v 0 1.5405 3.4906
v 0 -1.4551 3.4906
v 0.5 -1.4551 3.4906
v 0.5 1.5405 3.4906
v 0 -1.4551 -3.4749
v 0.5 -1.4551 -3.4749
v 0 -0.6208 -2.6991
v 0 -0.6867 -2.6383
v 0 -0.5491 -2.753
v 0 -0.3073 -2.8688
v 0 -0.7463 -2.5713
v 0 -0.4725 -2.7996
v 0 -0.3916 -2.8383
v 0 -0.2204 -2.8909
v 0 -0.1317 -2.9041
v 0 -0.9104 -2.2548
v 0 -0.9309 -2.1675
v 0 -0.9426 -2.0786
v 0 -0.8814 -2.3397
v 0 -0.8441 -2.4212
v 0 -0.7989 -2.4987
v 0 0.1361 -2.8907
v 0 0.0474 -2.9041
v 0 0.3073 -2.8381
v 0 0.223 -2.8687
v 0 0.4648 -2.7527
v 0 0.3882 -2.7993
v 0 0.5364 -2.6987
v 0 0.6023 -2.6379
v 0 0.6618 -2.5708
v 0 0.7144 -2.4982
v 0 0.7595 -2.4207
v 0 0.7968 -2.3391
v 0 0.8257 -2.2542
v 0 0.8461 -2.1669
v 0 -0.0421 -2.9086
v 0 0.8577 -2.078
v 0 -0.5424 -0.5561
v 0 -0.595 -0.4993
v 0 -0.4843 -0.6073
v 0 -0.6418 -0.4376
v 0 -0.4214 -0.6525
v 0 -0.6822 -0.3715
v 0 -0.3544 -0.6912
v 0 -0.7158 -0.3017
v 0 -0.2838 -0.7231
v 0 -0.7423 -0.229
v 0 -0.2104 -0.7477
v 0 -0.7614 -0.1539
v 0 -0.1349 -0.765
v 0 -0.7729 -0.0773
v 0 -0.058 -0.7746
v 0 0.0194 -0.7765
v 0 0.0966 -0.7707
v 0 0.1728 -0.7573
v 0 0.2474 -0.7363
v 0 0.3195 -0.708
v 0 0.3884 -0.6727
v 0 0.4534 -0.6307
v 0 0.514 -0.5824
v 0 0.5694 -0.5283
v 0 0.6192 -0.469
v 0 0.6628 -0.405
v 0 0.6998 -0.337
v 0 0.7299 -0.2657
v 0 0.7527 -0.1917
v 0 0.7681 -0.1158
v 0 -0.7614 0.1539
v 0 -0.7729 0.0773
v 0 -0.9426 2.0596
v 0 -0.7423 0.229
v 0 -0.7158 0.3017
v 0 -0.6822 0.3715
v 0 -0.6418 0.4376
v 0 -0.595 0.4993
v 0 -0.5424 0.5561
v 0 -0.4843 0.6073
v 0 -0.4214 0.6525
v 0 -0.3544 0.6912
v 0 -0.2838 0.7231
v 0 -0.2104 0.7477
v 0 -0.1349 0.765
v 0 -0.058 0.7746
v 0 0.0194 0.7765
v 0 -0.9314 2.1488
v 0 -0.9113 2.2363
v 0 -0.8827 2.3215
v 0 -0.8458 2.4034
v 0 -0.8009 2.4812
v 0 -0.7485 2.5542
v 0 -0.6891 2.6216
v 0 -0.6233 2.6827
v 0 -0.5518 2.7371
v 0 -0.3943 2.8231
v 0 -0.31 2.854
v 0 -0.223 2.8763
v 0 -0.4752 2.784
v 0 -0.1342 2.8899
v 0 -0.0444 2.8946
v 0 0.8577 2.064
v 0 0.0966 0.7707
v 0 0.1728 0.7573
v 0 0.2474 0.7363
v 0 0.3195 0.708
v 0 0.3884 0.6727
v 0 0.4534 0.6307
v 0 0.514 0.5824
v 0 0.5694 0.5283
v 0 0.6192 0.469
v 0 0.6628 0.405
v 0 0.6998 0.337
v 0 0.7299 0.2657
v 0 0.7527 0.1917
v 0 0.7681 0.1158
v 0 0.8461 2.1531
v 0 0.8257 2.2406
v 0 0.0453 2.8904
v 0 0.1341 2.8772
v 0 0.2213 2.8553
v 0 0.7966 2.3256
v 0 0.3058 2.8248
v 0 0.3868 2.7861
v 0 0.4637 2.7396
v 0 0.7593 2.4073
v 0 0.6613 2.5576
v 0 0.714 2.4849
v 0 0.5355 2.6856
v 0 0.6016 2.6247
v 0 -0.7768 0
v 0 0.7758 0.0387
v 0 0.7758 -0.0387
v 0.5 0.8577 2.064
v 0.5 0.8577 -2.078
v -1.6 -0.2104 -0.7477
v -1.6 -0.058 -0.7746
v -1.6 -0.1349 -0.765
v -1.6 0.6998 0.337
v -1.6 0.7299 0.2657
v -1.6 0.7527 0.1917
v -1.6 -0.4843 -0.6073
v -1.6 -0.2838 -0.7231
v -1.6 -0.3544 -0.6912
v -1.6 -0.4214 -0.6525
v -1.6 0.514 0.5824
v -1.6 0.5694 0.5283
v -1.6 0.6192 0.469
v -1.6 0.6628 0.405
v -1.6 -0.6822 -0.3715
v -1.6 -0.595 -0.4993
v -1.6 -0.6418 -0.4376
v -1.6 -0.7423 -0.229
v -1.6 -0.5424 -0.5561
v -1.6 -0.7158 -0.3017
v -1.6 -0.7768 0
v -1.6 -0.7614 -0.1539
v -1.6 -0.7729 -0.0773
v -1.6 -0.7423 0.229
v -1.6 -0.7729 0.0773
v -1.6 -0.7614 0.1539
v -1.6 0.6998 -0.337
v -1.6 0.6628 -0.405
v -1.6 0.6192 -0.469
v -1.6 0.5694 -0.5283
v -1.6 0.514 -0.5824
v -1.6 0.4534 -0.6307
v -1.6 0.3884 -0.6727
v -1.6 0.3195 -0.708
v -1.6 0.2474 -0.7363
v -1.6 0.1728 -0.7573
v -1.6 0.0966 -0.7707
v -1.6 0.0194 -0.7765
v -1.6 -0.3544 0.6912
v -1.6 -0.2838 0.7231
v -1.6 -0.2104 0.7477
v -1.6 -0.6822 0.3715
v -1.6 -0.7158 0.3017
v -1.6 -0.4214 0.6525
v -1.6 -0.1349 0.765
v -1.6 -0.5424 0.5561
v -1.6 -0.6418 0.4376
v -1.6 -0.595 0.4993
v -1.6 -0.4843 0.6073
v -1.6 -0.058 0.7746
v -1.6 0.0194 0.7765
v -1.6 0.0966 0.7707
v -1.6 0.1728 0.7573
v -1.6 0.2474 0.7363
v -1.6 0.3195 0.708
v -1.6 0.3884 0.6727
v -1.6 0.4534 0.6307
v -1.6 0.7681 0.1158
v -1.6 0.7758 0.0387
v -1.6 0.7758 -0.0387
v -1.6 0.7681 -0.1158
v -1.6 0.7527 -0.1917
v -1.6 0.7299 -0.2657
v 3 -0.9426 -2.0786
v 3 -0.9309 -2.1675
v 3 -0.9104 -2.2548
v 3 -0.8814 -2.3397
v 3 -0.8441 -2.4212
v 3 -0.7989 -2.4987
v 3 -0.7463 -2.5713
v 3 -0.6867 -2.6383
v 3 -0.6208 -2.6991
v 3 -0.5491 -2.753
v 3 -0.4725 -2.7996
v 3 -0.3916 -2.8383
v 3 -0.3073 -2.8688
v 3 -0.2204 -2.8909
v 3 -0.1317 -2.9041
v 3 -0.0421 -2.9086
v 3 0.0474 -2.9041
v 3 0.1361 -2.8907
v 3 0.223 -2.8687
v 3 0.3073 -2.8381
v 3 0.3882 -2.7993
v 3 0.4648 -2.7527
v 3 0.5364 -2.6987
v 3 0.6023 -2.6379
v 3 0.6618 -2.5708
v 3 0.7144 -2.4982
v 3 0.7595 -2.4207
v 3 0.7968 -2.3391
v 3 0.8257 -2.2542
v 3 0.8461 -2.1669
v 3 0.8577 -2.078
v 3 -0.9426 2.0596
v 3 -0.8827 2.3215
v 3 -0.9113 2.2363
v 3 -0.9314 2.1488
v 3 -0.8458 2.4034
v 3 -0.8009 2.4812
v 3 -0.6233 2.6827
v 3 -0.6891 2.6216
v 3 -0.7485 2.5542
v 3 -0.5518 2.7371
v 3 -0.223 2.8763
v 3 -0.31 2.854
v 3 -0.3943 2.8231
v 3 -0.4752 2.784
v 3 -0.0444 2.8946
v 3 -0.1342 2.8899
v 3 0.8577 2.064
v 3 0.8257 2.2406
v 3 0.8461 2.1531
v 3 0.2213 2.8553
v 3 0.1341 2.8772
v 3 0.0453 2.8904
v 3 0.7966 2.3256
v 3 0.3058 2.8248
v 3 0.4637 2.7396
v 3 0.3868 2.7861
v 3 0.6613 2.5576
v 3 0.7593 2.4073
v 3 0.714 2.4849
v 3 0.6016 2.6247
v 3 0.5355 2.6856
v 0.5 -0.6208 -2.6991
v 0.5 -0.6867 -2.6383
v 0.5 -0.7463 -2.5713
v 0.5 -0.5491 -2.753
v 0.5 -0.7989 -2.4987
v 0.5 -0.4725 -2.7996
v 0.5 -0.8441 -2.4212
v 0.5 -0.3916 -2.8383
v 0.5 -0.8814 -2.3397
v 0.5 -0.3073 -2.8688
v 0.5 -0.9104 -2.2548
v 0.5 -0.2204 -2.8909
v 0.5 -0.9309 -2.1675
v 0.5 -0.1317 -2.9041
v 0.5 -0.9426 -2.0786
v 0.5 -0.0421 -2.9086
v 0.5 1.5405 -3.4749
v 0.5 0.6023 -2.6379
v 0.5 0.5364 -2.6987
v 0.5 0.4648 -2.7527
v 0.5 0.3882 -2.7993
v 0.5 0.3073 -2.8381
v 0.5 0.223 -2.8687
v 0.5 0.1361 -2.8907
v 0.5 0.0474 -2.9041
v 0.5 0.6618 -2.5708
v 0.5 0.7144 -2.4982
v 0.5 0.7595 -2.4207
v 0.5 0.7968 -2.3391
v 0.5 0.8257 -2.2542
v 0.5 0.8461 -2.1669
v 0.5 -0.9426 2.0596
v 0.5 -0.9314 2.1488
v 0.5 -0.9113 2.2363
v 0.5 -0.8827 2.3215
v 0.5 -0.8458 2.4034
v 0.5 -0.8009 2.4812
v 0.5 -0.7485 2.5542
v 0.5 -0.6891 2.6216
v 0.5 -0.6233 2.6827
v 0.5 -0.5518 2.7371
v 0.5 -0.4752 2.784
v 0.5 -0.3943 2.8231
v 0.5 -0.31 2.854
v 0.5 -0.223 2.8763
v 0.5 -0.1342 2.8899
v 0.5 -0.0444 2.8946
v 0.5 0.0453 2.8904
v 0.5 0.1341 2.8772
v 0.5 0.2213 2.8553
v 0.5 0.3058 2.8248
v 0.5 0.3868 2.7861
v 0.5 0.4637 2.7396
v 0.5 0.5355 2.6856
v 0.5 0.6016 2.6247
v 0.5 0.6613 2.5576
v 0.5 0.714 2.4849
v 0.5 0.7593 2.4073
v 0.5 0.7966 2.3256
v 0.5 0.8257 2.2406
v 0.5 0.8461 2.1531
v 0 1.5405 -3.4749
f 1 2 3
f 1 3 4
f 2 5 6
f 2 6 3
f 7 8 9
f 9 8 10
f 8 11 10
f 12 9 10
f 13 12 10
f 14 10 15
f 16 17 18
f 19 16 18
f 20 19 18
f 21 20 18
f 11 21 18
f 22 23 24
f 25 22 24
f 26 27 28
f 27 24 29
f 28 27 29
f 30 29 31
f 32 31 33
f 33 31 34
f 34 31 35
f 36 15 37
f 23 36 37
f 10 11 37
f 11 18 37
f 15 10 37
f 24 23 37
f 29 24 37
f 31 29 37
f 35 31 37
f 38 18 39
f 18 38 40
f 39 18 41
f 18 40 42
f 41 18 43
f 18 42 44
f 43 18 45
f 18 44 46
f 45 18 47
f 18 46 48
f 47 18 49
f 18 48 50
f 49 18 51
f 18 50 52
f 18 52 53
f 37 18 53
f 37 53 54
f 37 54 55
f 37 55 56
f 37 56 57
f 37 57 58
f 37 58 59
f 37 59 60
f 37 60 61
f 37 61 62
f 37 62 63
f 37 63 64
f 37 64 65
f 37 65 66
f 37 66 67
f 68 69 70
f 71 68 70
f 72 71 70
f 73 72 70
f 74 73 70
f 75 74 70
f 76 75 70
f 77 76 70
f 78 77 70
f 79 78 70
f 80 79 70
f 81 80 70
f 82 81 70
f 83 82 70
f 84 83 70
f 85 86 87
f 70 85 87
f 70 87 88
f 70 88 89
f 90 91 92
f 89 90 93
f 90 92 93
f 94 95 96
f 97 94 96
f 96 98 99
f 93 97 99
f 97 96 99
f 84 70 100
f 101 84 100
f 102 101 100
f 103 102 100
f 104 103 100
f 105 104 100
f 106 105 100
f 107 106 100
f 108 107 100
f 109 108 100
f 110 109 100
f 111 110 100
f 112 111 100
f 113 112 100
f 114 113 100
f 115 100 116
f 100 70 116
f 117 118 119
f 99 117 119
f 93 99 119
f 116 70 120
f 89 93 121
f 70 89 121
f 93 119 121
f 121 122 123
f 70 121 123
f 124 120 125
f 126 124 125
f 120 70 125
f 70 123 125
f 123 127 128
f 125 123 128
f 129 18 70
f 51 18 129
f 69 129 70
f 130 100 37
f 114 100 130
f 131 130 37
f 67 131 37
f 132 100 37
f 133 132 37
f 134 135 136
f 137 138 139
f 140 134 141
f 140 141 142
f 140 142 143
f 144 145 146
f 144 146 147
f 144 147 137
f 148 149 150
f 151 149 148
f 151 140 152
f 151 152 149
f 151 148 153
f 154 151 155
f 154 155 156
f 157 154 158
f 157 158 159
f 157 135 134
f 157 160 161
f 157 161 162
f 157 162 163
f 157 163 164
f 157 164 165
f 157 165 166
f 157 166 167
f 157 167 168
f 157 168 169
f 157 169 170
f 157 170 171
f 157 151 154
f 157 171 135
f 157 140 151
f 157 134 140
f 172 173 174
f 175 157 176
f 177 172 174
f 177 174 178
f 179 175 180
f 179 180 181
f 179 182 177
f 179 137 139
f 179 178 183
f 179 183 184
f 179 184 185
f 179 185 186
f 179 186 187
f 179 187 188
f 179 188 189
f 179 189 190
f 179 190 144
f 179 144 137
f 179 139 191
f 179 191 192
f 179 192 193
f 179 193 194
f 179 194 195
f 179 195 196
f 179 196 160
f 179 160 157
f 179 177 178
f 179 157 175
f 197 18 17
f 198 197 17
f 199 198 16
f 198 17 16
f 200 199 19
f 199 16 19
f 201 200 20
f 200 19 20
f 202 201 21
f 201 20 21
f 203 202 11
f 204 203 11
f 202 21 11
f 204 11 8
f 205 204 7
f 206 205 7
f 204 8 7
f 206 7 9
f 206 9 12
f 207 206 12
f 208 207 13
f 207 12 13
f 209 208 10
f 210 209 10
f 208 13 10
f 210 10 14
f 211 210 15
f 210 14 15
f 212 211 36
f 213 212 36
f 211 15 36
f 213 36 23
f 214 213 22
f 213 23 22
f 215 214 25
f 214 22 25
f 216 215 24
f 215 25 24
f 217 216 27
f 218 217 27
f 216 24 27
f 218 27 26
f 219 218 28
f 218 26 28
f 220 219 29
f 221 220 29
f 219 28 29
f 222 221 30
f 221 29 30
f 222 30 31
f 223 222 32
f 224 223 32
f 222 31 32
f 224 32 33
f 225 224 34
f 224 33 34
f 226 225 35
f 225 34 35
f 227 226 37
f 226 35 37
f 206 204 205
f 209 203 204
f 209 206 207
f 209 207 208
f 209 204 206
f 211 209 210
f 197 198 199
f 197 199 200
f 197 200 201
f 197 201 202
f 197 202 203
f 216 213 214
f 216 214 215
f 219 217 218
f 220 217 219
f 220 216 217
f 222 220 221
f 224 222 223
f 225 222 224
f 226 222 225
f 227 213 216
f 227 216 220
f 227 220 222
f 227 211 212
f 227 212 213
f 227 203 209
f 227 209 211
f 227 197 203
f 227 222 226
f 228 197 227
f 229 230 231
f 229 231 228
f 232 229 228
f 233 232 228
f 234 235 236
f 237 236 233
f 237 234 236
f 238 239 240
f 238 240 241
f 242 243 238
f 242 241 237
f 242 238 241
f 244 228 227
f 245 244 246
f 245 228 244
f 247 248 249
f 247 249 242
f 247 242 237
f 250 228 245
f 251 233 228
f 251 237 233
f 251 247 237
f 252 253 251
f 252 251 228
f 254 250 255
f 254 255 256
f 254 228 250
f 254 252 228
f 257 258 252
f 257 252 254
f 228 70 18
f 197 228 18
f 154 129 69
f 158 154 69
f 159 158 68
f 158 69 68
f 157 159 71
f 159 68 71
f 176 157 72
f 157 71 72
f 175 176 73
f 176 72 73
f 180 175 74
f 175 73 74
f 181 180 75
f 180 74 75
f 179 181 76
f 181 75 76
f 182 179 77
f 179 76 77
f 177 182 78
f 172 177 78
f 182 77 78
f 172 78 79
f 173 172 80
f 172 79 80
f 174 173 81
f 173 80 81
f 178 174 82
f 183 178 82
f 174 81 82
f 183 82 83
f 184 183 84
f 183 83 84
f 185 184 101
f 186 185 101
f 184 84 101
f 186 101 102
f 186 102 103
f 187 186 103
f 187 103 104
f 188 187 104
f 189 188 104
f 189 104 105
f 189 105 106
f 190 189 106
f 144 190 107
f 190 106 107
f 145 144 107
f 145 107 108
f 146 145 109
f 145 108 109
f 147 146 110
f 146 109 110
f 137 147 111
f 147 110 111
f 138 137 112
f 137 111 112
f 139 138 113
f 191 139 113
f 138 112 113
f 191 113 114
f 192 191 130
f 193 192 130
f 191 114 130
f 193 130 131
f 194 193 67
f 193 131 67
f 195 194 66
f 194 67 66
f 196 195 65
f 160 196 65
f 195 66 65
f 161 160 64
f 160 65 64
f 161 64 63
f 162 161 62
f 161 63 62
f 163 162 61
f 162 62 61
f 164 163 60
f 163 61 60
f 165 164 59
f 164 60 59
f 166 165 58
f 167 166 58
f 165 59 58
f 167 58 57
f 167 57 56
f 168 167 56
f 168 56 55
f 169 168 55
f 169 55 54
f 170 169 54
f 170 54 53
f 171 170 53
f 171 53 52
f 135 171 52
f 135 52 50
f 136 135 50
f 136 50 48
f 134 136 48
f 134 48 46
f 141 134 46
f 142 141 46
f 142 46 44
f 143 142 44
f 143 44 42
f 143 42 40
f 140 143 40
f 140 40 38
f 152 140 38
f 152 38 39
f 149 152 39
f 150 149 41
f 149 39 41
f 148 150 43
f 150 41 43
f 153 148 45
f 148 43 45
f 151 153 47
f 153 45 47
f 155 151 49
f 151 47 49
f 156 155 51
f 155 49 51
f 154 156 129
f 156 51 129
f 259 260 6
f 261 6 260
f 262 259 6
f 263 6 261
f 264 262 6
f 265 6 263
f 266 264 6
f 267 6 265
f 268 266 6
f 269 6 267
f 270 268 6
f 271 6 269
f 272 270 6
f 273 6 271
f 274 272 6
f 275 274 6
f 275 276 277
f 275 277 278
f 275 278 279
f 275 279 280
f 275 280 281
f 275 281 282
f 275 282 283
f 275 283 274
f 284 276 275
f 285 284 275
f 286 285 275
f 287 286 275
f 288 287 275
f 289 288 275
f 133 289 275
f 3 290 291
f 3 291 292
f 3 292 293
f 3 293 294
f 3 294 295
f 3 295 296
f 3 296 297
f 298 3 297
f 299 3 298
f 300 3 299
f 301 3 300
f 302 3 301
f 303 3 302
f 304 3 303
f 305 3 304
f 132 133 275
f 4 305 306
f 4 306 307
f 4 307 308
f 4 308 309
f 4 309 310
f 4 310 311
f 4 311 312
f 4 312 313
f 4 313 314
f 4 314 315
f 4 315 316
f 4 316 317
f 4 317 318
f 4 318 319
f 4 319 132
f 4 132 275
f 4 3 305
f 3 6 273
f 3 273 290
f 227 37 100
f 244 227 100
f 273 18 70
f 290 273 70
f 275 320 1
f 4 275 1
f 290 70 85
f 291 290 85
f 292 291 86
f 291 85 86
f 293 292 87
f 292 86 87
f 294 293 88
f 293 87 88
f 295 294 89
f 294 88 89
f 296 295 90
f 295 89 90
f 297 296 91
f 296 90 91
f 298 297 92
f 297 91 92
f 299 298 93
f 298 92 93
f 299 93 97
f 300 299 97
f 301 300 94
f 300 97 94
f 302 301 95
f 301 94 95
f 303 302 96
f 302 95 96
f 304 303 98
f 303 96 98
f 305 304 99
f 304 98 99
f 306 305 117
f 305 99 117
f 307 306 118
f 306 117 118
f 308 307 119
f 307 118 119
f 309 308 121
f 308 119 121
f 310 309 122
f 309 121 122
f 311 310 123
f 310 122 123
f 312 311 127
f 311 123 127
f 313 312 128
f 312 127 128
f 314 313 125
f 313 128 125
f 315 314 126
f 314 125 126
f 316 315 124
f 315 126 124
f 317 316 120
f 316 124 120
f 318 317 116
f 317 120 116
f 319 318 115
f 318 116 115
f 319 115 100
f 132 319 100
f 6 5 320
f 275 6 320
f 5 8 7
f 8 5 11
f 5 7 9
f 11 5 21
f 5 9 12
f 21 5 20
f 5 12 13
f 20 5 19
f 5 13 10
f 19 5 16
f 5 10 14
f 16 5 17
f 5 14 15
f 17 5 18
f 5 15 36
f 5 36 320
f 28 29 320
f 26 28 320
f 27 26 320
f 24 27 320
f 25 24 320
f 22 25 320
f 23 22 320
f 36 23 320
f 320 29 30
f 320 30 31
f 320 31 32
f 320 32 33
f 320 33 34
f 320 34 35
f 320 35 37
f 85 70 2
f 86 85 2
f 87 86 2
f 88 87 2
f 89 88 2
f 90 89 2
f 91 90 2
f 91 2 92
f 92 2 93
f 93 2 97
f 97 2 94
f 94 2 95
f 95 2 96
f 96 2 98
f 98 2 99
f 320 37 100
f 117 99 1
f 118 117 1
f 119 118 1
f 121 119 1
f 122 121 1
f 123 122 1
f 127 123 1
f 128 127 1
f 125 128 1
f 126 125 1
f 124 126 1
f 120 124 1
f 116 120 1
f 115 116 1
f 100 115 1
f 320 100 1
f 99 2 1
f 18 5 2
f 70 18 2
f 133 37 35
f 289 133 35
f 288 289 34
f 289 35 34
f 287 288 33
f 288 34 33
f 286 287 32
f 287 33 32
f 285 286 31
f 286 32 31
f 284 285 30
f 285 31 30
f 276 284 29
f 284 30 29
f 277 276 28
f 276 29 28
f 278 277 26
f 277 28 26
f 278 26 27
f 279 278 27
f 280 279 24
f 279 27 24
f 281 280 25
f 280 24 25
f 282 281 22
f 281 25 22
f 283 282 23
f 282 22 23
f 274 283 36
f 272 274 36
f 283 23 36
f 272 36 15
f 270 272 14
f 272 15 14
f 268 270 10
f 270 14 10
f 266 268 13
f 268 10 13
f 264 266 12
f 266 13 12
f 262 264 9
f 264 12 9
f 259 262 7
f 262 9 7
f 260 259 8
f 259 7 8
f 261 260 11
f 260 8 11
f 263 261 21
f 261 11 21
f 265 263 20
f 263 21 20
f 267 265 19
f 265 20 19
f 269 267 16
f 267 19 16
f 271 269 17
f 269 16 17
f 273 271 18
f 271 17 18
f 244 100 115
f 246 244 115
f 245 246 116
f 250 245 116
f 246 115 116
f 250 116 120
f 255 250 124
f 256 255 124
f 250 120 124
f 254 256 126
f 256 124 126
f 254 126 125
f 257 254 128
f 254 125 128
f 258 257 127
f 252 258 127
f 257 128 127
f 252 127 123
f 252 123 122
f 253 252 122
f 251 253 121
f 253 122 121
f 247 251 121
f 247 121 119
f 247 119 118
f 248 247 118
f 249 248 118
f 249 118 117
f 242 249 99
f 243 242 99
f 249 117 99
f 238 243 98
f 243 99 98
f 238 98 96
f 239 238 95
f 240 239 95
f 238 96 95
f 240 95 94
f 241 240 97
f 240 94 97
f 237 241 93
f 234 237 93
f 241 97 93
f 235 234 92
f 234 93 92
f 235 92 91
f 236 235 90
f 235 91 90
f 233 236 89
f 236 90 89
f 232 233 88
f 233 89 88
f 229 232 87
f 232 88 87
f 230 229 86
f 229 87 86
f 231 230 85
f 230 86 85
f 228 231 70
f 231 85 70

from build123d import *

# Parameters (mm, degrees)
F0_W     = 2.995658
F0_H     = 6.965485
F1_DEPTH = 0.5
F2_DEPTH = 3
F3_R     = 0.776769
F4_DEPTH = 1.6


with BuildPart() as f1:
    # F0 (on Right) → F1 (new body)
    with BuildSketch(Plane.YZ):
        with Locations((0.042688, 0.007851)):
            Rectangle(F0_W, F0_H)
        with BuildLine():
            Line((-0.942557, -2.078591), (-0.942557, 2.05963))
            ThreePointArc((-0.942557, 2.05963), (-0.04445, 2.894599), (0.857747, 2.06405))
            Line((0.857747, 2.06405), (0.857747, -2.077991))
            ThreePointArc((0.857747, -2.077991), (-0.042128, -2.908563), (-0.942557, -2.078591))
        make_face(mode=Mode.SUBTRACT)
    extrude(amount=F1_DEPTH)


with BuildPart() as f2:
    # F0 (on Right) → F2 (new body)
    with BuildSketch(Plane.YZ):
        with BuildLine():
            ThreePointArc((0.857747, 2.06405), (-0.04445, 2.894599), (-0.942557, 2.05963))
            Line((-0.942557, 2.05963), (-0.942557, -2.078591))
            ThreePointArc((-0.942557, -2.078591), (-0.042128, -2.908563), (0.857747, -2.077991))
            Line((0.857747, -2.077991), (0.857747, 2.06405))
        make_face()
    extrude(amount=F2_DEPTH)

    # F3 (on face) → F4 (join)
    with BuildSketch(Plane(origin=(0, 0, 0), x_dir=(0, -1, 0), z_dir=(-1, 0, 0))):
        Circle(F3_R)
    extrude(amount=F4_DEPTH)


solid = Compound([f1.part, f2.part])
